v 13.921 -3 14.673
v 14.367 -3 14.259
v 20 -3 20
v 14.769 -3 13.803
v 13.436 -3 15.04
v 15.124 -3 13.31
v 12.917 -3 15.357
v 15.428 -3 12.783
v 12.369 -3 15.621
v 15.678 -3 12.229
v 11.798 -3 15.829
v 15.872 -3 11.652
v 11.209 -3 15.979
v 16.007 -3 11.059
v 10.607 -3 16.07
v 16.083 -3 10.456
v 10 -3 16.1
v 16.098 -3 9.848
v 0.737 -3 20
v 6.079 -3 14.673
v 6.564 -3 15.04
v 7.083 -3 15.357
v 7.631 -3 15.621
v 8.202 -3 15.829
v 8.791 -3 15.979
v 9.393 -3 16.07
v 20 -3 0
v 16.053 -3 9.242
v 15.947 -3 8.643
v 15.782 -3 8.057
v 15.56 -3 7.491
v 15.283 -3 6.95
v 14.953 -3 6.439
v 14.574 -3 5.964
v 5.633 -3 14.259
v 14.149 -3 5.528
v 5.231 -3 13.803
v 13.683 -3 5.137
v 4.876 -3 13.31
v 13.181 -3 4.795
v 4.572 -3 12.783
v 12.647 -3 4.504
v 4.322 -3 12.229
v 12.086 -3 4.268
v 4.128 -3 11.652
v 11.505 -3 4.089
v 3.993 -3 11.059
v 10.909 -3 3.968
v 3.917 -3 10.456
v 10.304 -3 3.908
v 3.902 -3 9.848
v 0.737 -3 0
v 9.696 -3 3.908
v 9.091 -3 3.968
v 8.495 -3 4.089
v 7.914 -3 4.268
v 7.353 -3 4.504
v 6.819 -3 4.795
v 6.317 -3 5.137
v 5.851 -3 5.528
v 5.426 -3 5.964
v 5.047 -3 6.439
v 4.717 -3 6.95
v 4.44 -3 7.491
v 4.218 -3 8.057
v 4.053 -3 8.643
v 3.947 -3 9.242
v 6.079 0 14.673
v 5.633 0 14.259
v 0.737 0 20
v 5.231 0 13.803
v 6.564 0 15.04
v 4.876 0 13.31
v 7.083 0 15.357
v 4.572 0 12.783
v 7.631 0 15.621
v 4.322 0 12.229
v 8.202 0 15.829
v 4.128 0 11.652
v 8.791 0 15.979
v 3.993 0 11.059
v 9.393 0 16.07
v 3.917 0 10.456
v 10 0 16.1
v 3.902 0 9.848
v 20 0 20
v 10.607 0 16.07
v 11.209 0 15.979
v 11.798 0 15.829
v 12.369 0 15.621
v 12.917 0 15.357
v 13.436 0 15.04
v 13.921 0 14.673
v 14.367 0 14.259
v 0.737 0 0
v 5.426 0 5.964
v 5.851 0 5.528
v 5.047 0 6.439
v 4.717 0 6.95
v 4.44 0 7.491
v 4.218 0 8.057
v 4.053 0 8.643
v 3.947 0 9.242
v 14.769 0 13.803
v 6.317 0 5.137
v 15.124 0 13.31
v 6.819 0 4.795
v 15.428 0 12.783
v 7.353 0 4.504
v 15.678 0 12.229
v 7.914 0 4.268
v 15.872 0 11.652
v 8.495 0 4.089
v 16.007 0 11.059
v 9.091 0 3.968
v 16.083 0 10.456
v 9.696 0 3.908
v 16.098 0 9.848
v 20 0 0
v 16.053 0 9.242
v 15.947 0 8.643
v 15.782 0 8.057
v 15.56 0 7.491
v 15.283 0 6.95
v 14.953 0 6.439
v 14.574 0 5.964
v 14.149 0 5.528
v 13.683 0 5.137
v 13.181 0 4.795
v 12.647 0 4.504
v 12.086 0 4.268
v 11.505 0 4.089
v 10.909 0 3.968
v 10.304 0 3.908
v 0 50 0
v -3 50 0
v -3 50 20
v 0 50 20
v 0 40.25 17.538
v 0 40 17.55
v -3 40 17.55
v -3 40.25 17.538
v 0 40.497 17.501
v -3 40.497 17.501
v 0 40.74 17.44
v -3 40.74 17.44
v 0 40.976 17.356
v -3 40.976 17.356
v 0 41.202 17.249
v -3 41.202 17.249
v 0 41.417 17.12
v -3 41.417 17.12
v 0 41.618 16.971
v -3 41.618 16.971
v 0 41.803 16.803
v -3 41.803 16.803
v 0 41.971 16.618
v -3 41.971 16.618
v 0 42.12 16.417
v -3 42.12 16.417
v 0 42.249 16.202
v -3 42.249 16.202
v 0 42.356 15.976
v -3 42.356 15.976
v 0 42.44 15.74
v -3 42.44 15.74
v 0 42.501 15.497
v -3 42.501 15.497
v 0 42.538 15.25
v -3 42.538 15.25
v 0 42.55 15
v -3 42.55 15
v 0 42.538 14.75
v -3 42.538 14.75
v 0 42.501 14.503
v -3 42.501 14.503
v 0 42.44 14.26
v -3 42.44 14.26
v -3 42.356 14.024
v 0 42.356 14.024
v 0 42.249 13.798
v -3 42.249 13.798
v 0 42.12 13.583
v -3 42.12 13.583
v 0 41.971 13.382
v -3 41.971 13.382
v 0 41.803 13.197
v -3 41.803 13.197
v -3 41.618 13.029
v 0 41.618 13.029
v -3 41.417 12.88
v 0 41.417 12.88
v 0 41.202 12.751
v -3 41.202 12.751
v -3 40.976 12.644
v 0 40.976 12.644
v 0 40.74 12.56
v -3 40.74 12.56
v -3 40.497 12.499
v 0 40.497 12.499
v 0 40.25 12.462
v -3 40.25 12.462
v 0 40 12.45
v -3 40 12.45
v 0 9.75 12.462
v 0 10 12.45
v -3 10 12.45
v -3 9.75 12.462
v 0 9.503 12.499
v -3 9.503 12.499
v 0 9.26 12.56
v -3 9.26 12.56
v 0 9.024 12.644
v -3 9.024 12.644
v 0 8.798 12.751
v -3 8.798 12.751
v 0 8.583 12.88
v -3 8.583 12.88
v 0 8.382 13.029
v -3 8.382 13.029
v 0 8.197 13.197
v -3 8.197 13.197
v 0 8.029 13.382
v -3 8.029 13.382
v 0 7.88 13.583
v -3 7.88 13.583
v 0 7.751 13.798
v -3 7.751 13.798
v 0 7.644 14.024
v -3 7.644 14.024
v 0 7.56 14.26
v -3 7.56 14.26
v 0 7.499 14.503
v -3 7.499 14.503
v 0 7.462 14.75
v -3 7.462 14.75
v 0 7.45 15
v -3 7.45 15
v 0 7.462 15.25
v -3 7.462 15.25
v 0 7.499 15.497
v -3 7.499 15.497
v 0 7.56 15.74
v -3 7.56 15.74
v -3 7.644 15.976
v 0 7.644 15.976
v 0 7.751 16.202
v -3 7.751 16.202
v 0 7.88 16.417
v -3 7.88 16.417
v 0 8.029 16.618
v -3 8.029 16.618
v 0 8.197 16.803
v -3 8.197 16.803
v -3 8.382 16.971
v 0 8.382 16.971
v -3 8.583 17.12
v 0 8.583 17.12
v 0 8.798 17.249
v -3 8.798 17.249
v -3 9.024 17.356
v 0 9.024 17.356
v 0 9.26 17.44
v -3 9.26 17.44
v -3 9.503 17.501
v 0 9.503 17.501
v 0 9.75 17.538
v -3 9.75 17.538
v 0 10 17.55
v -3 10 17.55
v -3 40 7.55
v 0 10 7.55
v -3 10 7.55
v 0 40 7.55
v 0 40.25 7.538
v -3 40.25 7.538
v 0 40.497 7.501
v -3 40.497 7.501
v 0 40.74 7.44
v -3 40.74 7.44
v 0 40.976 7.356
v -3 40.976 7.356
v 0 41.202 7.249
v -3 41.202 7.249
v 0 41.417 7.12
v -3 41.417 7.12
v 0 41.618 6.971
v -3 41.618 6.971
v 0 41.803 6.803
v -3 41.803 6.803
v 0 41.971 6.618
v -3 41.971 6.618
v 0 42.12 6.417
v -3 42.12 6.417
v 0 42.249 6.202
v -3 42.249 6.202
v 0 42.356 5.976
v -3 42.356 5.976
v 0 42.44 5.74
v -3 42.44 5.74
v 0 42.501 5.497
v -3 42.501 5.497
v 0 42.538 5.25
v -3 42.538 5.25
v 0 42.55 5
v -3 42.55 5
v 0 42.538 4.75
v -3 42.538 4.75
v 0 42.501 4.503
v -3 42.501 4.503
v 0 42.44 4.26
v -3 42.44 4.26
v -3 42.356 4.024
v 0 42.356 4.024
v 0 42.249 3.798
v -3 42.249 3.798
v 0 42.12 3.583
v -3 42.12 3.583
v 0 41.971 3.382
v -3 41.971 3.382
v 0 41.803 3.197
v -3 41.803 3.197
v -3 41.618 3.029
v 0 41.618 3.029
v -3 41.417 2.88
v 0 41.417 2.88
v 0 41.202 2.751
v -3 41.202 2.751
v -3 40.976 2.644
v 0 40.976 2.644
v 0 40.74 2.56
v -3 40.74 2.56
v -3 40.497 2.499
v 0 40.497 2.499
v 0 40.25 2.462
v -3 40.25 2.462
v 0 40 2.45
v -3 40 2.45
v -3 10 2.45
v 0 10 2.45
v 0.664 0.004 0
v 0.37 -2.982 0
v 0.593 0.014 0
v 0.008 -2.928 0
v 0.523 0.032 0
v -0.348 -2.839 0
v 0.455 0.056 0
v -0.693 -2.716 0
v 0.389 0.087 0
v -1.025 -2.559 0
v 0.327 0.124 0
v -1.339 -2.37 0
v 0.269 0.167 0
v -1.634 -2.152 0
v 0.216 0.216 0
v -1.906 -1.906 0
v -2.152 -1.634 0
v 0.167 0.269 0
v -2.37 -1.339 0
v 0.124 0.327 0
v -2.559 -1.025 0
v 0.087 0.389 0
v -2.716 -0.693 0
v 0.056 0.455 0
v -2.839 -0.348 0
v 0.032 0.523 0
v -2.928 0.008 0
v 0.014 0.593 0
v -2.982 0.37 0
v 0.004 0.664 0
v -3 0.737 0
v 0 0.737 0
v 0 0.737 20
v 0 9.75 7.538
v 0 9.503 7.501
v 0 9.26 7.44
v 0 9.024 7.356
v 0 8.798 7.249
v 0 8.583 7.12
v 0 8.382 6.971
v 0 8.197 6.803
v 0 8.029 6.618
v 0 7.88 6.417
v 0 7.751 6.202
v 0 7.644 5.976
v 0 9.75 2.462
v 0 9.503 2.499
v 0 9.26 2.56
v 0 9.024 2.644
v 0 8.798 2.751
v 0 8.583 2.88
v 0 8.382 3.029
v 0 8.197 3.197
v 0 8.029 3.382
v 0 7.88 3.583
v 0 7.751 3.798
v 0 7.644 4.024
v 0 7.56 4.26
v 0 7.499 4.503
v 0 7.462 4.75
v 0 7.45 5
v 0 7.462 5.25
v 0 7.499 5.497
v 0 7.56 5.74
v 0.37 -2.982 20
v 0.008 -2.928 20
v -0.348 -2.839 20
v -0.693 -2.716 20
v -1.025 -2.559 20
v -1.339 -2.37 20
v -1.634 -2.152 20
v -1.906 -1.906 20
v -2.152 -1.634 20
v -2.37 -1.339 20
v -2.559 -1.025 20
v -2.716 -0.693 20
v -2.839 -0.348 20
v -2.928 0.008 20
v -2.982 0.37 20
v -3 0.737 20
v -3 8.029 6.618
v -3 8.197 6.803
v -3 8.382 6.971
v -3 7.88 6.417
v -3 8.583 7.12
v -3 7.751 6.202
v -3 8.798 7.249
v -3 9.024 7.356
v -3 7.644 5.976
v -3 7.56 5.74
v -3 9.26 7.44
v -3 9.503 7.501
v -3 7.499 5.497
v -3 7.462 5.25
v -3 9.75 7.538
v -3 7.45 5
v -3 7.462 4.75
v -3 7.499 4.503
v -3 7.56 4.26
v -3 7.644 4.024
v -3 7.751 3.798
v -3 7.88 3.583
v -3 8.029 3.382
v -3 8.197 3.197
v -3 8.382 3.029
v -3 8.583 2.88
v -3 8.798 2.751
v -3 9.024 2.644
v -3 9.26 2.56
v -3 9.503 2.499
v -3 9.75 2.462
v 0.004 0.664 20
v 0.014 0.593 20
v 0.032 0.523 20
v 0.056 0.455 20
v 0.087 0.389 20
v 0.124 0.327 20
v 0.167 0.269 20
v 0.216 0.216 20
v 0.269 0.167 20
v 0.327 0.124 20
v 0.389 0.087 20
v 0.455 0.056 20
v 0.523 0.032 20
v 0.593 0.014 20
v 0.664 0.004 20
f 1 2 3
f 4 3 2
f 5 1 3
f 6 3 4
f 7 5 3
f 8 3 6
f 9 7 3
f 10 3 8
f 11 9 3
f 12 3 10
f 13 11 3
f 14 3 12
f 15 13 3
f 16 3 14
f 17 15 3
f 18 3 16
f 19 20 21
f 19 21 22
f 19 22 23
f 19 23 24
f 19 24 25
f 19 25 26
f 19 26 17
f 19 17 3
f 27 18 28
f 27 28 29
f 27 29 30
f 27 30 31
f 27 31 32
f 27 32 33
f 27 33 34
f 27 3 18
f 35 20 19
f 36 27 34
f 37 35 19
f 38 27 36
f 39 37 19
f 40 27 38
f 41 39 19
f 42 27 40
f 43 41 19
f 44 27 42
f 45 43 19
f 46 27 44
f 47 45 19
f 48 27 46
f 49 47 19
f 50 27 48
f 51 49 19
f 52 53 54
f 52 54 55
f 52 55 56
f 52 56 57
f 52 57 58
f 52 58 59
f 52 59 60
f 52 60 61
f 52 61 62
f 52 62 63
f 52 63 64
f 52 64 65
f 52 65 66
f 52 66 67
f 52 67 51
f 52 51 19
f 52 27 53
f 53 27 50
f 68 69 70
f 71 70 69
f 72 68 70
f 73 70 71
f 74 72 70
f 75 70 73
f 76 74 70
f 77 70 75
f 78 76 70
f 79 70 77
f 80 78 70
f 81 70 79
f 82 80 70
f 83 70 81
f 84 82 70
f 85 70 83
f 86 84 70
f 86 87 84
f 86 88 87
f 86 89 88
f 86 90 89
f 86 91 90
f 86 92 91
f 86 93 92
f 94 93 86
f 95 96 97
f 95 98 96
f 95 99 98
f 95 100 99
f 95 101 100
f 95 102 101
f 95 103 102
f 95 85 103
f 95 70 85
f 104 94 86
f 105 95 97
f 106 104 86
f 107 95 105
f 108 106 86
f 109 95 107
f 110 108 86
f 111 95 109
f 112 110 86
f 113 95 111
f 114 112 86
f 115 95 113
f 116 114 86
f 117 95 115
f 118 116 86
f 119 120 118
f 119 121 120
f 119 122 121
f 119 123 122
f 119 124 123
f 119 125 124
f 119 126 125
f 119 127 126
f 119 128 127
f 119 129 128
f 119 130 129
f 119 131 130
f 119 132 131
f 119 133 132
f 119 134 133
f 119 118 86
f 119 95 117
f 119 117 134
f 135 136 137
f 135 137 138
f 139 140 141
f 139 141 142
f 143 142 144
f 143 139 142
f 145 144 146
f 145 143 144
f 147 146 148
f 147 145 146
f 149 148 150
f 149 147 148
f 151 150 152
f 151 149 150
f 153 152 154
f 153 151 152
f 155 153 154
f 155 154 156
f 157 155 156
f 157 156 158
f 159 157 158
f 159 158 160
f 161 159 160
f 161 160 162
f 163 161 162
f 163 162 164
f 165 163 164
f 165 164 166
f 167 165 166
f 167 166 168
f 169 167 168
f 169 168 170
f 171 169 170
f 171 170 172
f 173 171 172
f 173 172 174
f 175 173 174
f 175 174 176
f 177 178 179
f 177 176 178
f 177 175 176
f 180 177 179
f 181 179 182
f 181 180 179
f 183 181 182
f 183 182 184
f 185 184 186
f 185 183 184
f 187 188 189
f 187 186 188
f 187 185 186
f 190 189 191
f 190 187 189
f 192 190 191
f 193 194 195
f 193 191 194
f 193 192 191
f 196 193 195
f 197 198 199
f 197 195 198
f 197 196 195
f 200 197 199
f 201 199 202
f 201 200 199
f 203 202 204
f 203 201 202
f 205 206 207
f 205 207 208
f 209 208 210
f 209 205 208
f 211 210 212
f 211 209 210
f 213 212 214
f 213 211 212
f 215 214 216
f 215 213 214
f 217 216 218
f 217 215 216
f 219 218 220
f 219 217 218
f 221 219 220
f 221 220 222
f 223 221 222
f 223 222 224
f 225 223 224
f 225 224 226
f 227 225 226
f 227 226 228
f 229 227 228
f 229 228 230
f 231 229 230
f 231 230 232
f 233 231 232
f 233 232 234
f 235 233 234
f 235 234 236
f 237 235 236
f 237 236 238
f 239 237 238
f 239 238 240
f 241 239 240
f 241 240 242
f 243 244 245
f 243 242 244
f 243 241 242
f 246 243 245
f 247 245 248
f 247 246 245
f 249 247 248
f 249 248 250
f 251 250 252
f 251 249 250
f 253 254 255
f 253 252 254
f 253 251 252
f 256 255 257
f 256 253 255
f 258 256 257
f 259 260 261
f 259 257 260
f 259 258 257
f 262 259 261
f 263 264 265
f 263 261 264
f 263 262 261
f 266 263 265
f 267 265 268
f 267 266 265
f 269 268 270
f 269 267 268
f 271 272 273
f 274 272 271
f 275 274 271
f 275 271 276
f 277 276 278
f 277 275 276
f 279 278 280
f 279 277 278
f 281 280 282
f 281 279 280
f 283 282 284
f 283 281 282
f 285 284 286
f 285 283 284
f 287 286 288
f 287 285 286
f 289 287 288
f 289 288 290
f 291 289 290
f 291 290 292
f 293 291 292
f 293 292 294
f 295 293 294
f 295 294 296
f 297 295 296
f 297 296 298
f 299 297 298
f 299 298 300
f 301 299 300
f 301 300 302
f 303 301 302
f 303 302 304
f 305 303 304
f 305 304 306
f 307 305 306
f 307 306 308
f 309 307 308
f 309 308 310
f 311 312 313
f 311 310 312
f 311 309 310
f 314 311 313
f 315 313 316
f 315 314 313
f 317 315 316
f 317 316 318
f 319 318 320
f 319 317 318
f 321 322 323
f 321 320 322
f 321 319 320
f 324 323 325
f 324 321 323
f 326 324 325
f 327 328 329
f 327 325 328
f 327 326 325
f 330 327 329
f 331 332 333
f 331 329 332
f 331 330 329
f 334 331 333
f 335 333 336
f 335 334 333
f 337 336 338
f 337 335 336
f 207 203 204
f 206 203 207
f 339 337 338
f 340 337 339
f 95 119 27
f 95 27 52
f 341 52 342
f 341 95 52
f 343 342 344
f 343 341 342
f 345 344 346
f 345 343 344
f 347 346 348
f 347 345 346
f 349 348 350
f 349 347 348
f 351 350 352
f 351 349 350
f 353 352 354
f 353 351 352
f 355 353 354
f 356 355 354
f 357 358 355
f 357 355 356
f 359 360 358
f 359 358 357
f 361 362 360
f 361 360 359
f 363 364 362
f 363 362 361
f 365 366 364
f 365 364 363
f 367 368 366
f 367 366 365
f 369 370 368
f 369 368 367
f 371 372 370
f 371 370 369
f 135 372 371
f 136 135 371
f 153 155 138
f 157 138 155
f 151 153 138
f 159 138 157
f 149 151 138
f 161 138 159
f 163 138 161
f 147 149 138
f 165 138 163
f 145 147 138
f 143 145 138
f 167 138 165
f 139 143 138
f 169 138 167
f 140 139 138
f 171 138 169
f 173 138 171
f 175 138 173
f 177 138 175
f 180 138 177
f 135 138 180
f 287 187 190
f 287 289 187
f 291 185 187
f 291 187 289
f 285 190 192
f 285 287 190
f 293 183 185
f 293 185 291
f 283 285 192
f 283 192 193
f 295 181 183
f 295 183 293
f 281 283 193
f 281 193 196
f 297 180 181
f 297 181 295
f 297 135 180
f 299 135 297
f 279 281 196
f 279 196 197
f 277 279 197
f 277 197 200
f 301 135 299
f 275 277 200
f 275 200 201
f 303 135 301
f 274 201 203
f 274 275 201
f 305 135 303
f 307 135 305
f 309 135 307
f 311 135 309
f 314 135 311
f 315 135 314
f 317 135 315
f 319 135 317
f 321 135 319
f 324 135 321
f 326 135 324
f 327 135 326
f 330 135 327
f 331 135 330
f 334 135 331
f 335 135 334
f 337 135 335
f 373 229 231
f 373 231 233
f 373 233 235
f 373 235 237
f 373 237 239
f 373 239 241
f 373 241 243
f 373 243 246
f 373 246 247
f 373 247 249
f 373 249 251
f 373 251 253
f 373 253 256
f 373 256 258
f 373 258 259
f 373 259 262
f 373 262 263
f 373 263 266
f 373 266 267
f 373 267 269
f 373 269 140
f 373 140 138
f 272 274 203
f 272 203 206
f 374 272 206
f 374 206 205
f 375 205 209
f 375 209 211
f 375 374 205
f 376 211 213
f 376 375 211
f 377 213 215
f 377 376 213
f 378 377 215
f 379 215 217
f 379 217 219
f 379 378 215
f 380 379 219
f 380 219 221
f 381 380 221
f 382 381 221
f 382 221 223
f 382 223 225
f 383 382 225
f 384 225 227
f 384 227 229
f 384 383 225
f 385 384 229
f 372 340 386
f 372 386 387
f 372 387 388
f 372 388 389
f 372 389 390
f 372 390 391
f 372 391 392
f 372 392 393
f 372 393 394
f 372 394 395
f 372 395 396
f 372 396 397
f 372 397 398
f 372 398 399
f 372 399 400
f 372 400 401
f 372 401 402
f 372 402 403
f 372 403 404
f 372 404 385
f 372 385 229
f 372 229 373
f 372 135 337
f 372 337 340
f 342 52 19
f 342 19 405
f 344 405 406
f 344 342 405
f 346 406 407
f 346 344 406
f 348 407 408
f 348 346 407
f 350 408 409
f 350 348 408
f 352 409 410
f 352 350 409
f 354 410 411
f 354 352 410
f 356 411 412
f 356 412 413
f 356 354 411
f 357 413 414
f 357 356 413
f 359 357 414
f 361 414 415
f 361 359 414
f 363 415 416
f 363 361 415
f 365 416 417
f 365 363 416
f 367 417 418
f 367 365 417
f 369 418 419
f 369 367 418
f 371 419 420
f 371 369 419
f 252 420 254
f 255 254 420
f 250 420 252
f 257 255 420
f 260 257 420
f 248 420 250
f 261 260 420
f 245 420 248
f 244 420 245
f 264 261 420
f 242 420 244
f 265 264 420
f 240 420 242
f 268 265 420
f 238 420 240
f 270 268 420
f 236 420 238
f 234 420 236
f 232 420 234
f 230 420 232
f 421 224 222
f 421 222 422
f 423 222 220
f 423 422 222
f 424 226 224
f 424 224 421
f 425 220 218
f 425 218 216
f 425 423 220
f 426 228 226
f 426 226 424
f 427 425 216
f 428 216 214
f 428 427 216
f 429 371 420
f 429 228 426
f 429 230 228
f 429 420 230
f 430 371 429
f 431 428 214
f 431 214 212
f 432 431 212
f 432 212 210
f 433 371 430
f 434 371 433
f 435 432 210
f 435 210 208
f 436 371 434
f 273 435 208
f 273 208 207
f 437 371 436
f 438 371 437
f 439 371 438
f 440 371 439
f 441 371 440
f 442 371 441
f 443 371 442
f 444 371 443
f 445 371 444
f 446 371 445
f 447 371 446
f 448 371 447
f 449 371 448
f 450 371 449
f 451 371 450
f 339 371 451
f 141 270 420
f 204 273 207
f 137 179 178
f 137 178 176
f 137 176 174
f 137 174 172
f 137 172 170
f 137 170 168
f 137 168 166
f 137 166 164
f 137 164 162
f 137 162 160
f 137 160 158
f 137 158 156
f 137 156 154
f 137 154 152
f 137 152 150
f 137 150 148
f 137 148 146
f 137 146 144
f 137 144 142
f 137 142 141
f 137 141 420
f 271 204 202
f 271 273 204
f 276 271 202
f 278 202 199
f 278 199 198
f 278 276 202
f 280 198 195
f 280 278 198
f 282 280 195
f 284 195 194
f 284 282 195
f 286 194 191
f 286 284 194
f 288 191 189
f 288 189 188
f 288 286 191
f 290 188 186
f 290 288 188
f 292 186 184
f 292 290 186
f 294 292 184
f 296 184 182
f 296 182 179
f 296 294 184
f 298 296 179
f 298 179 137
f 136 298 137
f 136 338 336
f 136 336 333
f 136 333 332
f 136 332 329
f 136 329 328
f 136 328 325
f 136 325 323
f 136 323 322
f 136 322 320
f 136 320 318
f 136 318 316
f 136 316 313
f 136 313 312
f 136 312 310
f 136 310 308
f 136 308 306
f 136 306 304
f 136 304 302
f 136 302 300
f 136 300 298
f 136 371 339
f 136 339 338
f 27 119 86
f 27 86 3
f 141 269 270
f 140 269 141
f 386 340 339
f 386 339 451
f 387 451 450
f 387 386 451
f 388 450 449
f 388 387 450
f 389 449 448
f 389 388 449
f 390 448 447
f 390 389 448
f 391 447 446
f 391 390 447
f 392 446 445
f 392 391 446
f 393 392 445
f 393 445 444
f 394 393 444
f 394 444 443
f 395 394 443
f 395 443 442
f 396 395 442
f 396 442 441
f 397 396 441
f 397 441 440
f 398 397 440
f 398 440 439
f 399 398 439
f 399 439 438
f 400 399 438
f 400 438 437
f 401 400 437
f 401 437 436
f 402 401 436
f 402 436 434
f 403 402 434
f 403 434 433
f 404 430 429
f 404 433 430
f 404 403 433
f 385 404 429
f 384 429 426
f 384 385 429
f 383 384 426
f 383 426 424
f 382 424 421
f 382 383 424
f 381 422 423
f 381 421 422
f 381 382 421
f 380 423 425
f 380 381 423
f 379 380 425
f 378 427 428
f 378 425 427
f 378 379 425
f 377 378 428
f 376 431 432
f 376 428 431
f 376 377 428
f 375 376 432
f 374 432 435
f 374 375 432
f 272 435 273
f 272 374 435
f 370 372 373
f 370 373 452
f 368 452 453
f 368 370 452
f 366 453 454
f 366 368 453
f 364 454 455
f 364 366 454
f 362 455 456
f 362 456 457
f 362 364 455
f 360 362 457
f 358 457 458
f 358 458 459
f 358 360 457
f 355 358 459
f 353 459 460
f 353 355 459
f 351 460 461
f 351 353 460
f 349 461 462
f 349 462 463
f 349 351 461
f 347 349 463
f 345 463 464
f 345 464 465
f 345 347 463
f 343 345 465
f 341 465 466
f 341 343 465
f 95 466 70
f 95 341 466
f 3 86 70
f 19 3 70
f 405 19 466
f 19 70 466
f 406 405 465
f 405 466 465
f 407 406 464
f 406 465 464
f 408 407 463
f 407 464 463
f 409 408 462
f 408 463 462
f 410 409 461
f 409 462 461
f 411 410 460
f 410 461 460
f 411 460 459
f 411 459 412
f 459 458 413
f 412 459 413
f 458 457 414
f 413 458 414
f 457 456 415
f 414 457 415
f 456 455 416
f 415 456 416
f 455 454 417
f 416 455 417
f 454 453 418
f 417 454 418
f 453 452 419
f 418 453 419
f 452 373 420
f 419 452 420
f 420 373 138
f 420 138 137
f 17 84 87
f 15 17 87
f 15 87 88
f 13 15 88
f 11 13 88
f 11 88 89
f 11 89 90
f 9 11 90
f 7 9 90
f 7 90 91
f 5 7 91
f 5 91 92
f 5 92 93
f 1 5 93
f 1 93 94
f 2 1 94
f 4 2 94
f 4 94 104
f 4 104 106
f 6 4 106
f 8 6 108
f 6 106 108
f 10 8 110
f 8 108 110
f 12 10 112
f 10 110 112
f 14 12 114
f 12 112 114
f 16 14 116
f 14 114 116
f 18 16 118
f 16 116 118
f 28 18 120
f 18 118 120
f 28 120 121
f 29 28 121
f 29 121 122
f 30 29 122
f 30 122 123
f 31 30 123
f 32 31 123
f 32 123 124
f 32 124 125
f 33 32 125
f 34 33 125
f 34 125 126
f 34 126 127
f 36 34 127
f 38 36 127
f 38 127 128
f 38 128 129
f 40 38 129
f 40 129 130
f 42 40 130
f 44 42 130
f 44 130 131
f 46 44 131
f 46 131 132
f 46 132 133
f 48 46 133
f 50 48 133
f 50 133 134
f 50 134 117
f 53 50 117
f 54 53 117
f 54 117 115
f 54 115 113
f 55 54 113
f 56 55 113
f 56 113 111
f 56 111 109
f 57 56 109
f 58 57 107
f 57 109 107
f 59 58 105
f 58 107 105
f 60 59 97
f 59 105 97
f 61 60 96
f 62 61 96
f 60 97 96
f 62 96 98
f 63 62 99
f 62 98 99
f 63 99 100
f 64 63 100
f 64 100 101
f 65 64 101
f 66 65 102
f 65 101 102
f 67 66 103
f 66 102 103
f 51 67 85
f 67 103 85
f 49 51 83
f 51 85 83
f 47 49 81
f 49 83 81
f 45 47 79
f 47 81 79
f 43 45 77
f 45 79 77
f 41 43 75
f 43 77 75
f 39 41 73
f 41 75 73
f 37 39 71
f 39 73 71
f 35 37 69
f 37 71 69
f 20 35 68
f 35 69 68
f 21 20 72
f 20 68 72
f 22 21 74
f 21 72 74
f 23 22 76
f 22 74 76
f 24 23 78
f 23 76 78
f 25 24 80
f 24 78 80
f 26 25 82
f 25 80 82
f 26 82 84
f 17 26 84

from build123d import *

# Parameters (mm, degrees)
BASE_FLANGE1_DEPTH = 20
CUT_EXTRUDE1_REACH = 59.446
SKETCH6_R          = 6.1
CUT_EXTRUDE2_REACH = 59.446


# Sheet-metal steps are written as plain solids
with BuildPart() as part:
    # Sketch1 → Base-Flange1 (new body)
    with BuildSketch(Plane.XY):
        with BuildLine():
            Line((0, 50), (0, 0.7366))
            ThreePointArc((0, 0.7366), (0.215745145, 0.215745145), (0.7366, 0))
            Line((0.7366, 0), (20, 0))
            Line((20, 0), (20, -3))
            Line((20, -3), (0.7366, -3))
            ThreePointArc((0.7366, -3), (-1.905575199, -1.905575199), (-3, 0.7366))
            Line((-3, 0.7366), (-3, 50))
            Line((-3, 50), (0, 50))
        make_face()
    extrude(amount=BASE_FLANGE1_DEPTH)

    # Sketch6 → Cut-Extrude1 (cut, up to next)
    with BuildSketch(Plane(origin=(0, 0, 0), x_dir=(1, 0, 0), z_dir=(0, 1, 0)), mode=Mode.PRIVATE) as cut_extrude1_sk1:
        with Locations(Location((10, -10, 0), (0, 0, 270))):
            Circle(SKETCH6_R)
    cut_extrude1_tool1 = extrude(cut_extrude1_sk1.sketch, amount=-CUT_EXTRUDE1_REACH, mode=Mode.PRIVATE) & part.part
    add(cut_extrude1_tool1.solids().sort_by_distance((10, 0, 10))[0], mode=Mode.SUBTRACT)

    # Sketch7 → Cut-Extrude2 (cut, up to next)
    with BuildSketch(Plane(origin=(0, 0, 0), x_dir=(0, 0, -1), z_dir=(1, 0, 0)), mode=Mode.PRIVATE) as cut_extrude2_sk1:
        with BuildLine():
            Line((-12.45, 40), (-12.45, 10))
            ThreePointArc((-12.45, 10), (-15, 7.45), (-17.55, 10))
            Line((-17.55, 10), (-17.55, 40))
            ThreePointArc((-17.55, 40), (-15, 42.55), (-12.45, 40))
        make_face()
    cut_extrude2_tool1 = extrude(cut_extrude2_sk1.sketch, amount=-CUT_EXTRUDE2_REACH, mode=Mode.PRIVATE) & part.part
    # Sketch7 → Cut-Extrude2 (cut, up to next)
    with BuildSketch(Plane(origin=(0, 0, 0), x_dir=(0, 0, -1), z_dir=(1, 0, 0)), mode=Mode.PRIVATE) as cut_extrude2_sk2:
        with BuildLine():
            Line((-2.45, 40), (-2.45, 10))
            ThreePointArc((-2.45, 10), (-5, 7.45), (-7.55, 10))
            Line((-7.55, 10), (-7.55, 40))
            ThreePointArc((-7.55, 40), (-5, 42.55), (-2.45, 40))
        make_face()
    cut_extrude2_tool2 = extrude(cut_extrude2_sk2.sketch, amount=-CUT_EXTRUDE2_REACH, mode=Mode.PRIVATE) & part.part
    add(cut_extrude2_tool1.solids().sort_by_distance((0, 25, 15))[0], mode=Mode.SUBTRACT)
    add(cut_extrude2_tool2.solids().sort_by_distance((0, 25, 5))[0], mode=Mode.SUBTRACT)


solid = part.part
